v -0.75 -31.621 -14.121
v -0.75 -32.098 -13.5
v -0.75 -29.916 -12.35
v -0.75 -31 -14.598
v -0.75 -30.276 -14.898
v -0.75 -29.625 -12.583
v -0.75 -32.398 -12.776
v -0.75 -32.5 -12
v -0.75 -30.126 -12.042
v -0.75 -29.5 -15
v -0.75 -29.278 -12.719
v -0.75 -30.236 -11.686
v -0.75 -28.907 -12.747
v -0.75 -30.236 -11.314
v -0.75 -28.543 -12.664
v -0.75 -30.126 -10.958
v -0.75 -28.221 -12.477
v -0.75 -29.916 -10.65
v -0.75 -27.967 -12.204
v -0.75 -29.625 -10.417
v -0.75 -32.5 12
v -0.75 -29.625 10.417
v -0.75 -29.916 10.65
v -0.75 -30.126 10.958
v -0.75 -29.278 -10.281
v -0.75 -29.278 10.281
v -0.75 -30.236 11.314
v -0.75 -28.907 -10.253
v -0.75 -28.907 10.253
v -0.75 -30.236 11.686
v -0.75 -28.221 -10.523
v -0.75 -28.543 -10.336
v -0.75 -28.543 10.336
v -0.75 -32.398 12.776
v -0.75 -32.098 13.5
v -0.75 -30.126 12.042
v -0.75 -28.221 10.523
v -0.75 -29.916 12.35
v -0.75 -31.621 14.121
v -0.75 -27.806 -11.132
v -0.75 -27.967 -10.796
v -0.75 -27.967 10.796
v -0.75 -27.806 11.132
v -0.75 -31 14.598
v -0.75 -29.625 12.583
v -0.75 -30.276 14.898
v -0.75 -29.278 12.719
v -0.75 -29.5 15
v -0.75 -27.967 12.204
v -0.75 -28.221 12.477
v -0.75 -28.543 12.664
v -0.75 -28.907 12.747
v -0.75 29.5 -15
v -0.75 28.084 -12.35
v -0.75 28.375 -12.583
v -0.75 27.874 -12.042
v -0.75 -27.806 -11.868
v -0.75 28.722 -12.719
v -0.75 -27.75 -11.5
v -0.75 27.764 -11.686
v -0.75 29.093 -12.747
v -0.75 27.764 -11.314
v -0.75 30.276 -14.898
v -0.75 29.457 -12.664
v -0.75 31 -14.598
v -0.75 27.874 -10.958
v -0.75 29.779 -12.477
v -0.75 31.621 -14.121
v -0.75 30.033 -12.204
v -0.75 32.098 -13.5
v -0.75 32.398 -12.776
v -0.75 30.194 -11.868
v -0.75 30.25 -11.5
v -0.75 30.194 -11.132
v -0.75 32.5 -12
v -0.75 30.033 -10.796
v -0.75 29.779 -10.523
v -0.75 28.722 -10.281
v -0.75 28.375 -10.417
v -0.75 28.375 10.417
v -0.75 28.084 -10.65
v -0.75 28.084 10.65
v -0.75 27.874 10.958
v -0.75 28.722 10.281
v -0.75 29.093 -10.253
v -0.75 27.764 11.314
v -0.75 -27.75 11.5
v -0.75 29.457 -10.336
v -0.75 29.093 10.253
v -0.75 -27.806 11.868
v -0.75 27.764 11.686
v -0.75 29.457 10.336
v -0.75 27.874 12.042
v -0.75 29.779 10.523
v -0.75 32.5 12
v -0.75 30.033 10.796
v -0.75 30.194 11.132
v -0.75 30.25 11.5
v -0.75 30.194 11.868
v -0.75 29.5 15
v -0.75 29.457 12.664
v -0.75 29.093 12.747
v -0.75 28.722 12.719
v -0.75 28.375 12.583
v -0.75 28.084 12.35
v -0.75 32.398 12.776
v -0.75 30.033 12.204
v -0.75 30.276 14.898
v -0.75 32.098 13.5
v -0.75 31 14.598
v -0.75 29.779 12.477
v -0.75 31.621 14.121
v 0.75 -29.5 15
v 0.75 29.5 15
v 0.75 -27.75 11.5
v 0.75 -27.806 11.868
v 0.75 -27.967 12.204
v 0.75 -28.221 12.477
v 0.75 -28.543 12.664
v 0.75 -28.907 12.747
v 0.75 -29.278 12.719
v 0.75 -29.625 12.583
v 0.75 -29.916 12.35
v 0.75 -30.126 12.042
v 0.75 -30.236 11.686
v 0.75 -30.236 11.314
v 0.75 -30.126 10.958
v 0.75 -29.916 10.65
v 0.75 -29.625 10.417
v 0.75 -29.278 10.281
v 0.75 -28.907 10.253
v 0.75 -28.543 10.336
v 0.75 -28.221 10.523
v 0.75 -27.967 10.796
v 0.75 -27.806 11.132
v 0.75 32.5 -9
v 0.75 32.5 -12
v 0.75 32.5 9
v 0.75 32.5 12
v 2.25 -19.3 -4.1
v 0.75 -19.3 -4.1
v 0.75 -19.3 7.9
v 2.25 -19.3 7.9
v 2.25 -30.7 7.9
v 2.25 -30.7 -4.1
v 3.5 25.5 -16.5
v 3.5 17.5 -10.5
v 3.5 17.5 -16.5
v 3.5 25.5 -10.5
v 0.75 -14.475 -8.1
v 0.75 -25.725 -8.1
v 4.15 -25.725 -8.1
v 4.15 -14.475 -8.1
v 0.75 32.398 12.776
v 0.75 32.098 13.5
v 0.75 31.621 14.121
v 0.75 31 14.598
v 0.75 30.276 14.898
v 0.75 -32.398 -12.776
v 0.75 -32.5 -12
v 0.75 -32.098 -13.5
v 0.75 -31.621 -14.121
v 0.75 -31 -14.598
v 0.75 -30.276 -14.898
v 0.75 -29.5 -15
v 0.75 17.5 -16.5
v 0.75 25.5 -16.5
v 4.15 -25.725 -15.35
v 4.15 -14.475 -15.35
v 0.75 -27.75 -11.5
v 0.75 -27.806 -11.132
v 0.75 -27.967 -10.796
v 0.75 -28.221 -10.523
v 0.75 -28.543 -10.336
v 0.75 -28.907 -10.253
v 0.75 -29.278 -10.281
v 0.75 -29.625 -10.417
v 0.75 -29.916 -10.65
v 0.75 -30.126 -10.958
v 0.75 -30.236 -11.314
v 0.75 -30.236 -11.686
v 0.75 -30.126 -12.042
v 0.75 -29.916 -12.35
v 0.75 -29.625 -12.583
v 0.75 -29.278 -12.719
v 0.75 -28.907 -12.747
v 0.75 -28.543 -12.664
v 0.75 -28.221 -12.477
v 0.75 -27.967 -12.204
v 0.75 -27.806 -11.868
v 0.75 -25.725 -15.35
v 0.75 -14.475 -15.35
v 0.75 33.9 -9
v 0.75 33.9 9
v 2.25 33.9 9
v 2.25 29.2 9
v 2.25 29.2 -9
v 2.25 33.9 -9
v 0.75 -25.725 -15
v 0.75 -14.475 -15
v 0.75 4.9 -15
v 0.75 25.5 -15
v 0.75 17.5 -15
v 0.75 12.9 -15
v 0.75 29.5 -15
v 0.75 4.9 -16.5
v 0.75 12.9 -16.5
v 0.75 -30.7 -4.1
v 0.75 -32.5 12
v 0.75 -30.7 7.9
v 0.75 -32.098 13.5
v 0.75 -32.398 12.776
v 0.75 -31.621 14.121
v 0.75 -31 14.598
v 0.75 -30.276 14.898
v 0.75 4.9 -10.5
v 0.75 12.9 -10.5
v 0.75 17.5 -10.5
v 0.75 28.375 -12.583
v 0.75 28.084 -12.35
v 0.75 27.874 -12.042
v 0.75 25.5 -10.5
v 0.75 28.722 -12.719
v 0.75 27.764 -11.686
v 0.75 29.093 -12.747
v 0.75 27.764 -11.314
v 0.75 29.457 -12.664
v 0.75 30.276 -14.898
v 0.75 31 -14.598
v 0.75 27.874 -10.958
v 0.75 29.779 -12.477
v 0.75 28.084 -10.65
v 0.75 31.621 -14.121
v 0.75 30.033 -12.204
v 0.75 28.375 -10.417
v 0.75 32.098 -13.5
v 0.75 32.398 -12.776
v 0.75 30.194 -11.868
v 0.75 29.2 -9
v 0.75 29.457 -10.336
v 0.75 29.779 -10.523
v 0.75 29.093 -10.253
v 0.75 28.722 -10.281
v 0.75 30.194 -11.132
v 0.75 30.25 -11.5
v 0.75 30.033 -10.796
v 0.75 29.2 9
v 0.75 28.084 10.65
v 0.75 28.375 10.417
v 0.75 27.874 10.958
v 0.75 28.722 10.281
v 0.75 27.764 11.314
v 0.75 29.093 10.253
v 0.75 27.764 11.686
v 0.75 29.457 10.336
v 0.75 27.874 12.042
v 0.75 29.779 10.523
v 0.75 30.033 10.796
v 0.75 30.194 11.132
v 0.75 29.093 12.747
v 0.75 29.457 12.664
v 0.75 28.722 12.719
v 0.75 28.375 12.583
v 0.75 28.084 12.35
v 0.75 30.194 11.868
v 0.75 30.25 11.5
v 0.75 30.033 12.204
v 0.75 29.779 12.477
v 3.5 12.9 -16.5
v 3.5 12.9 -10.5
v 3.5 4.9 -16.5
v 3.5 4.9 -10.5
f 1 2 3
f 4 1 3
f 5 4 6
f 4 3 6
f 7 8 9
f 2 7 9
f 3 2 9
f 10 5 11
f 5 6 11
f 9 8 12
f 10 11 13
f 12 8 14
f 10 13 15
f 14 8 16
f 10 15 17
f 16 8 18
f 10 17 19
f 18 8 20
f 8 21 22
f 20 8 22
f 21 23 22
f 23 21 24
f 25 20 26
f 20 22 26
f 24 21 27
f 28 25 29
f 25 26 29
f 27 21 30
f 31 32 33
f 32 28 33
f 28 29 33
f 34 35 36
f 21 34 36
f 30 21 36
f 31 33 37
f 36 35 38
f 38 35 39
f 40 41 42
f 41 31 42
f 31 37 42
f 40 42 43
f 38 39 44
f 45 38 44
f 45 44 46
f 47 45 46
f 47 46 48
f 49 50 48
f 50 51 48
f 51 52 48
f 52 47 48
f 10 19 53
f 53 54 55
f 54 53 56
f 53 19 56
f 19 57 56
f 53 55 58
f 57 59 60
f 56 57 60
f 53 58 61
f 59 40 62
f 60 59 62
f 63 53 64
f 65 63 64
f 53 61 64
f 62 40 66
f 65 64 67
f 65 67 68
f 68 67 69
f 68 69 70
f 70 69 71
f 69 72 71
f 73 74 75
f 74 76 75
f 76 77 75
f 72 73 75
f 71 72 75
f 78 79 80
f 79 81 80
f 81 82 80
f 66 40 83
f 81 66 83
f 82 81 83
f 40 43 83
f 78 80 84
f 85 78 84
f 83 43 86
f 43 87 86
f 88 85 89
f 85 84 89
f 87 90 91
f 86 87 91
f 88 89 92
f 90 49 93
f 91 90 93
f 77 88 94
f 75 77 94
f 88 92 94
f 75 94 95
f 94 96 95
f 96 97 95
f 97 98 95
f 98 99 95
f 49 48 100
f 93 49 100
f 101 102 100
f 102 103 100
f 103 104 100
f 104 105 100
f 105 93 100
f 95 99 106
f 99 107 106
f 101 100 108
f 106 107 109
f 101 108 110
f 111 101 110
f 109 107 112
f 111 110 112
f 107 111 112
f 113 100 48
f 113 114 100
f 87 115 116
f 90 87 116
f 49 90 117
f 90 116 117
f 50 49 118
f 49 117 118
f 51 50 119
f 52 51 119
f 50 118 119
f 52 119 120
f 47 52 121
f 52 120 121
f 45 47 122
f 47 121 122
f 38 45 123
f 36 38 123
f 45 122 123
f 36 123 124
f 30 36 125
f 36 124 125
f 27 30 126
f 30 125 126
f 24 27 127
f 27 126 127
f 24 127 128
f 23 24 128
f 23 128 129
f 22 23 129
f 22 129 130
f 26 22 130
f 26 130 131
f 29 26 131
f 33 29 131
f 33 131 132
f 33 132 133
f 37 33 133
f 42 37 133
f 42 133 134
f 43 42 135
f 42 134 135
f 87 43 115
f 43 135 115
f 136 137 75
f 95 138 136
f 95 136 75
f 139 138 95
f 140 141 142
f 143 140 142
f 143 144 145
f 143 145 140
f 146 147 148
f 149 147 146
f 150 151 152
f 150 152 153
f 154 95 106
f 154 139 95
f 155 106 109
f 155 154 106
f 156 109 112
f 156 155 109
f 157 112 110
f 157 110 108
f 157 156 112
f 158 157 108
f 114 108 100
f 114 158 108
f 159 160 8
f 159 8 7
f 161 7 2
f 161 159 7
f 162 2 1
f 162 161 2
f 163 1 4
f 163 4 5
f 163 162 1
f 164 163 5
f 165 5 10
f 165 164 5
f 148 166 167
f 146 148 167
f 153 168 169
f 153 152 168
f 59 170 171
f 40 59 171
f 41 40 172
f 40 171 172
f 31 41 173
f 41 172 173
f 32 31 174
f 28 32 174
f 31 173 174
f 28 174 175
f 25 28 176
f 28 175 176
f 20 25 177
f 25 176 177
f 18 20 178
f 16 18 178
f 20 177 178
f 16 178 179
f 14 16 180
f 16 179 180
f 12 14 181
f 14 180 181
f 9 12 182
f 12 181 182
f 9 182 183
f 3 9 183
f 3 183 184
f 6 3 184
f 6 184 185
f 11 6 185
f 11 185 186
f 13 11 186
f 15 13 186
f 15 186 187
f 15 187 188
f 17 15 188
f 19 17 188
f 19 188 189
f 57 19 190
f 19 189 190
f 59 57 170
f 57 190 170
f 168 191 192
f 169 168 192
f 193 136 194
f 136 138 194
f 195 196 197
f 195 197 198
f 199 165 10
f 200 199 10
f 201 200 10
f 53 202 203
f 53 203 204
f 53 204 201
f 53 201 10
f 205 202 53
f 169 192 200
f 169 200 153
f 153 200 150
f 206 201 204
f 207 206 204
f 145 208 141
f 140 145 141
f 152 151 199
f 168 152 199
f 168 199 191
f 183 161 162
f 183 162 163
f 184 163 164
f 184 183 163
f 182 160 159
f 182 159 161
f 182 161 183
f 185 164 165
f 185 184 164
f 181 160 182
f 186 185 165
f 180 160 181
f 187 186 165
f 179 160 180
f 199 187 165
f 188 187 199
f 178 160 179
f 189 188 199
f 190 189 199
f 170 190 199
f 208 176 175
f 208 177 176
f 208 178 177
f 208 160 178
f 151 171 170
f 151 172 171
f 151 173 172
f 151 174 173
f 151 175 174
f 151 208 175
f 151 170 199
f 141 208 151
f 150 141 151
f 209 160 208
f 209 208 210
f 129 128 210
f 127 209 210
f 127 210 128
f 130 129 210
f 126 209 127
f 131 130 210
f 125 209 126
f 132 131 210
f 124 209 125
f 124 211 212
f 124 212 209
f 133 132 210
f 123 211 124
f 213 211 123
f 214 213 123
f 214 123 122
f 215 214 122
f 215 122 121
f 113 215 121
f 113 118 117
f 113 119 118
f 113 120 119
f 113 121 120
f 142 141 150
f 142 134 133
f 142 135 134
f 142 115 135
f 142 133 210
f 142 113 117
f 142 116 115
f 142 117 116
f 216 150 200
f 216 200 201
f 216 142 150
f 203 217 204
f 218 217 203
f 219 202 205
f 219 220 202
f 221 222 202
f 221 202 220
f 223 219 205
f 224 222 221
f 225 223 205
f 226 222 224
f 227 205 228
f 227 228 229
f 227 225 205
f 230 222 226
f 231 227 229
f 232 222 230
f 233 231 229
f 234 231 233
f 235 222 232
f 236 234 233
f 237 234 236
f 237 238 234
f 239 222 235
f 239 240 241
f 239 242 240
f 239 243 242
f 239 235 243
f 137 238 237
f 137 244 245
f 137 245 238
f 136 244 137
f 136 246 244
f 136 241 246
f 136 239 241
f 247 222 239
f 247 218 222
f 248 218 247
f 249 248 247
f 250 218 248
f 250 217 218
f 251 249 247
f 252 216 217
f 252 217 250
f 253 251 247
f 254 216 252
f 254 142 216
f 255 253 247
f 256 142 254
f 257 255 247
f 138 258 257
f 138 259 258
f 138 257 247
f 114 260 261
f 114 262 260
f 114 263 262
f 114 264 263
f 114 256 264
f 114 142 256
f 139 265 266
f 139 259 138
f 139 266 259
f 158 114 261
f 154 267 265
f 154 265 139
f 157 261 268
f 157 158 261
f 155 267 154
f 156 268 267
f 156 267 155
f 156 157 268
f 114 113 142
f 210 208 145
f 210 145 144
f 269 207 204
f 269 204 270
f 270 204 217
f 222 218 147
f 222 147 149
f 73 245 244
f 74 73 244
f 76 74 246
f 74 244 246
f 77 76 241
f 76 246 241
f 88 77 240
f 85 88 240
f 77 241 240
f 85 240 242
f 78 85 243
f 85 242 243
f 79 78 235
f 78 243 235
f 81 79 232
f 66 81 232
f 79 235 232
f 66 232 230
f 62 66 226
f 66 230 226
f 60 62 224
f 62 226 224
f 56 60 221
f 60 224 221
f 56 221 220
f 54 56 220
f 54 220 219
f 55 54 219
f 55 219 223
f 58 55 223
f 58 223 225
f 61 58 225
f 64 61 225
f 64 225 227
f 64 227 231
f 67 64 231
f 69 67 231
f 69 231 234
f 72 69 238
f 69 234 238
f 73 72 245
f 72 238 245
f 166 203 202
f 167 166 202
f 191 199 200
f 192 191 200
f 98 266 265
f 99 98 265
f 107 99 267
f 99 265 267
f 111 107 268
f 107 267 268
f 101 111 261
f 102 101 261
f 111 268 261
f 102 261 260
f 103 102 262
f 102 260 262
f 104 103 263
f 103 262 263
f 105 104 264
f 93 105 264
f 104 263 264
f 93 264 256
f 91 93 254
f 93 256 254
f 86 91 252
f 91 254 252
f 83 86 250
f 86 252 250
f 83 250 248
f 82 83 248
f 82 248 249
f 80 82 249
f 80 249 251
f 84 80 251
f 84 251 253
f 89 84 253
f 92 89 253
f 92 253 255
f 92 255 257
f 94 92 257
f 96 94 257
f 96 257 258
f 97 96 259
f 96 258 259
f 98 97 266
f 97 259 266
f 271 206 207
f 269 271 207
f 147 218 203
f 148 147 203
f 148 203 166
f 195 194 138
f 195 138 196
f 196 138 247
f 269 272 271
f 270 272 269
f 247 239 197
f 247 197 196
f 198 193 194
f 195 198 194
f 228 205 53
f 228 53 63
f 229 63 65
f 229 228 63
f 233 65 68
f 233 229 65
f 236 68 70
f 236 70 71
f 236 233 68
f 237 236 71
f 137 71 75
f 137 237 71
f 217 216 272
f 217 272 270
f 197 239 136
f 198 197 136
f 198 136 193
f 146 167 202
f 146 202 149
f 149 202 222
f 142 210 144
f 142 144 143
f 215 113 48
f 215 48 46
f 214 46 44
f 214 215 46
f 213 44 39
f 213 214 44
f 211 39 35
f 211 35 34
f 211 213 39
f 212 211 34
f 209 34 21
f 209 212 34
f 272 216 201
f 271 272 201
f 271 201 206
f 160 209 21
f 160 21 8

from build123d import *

# Parameters (mm, degrees)
F1_DEPTH = 0.75
F2_R     = 1.25
F3_DEPTH = 1.5
F4_W     = 11.25
F4_H     = 0.35
F4_H_2   = 6.9
F5_DEPTH = 3.4
F4_W_2   = 8
F4_H_3   = 4.5
F4_H_4   = 1.5
F6_DEPTH = 2.75
F4_W_3   = 1.4
F4_H_5   = 18
F4_W_4   = 3.3
F7_DEPTH = 1.5
F4_W_5   = 11.4
F4_H_6   = 12
F8_DEPTH = 1.5


with BuildPart() as f1:
    # F0 (on Right) → F1 (new body, symmetric)
    with BuildSketch(Plane.YZ):
        with BuildLine():
            Line((29.5, 15), (-29.5, 15))
            ThreePointArc((-29.5, 15), (-31.6213203436, 14.1213203436), (-32.5, 12))
            Line((-32.5, 12), (-32.5, -12))
            ThreePointArc((-32.5, -12), (-31.6213203436, -14.1213203436), (-29.5, -15))
            Line((-29.5, -15), (29.5, -15))
            ThreePointArc((29.5, -15), (31.6213203436, -14.1213203436), (32.5, -12))
            Line((32.5, -12), (32.5, 12))
            ThreePointArc((32.5, 12), (31.6213203436, 14.1213203436), (29.5, 15))
        make_face()
    extrude(amount=F1_DEPTH, both=True)

    # F2 (on face) → F3 (cut, through all)
    with BuildSketch(Plane.YZ.offset(0.75)):
        with Locations((-29, 11.5)):
            Circle(F2_R)
        with Locations((29, 11.5)):
            Circle(F2_R)
        with Locations((29, -11.5)):
            Circle(F2_R)
        with Locations((-29, -11.5)):
            Circle(F2_R)
    extrude(amount=-F3_DEPTH, mode=Mode.SUBTRACT)

    # F4 (on face) → F5 (join)
    with BuildSketch(Plane.YZ.offset(0.75)):
        with Locations((-20.1, -15.175)):
            Rectangle(F4_W, F4_H)
        with Locations((-20.1, -11.55)):
            Rectangle(F4_W, F4_H_2)
    extrude(amount=F5_DEPTH)

    # F4 (on face) → F6 (join)
    with BuildSketch(Plane.YZ.offset(0.75)):
        with Locations((8.9, -12.75)):
            Rectangle(F4_W_2, F4_H_3)
        with Locations((8.9, -15.75)):
            Rectangle(F4_W_2, F4_H_4)
        with Locations((21.5, -12.75)):
            Rectangle(F4_W_2, F4_H_3)
        with Locations((21.5, -15.75)):
            Rectangle(F4_W_2, F4_H_4)
    extrude(amount=F6_DEPTH)

    # F4 (on face) → F7 (join)
    with BuildSketch(Plane.YZ.offset(0.75)):
        with Locations((33.2, 0)):
            Rectangle(F4_W_3, F4_H_5)
        with Locations((30.85, 0)):
            Rectangle(F4_W_4, F4_H_5)
    extrude(amount=F7_DEPTH)

    # F4 (on face) → F8 (join)
    with BuildSketch(Plane.YZ.offset(0.75)):
        with Locations((-25, 1.9)):
            Rectangle(F4_W_5, F4_H_6)
    extrude(amount=F8_DEPTH)


solid = f1.part
